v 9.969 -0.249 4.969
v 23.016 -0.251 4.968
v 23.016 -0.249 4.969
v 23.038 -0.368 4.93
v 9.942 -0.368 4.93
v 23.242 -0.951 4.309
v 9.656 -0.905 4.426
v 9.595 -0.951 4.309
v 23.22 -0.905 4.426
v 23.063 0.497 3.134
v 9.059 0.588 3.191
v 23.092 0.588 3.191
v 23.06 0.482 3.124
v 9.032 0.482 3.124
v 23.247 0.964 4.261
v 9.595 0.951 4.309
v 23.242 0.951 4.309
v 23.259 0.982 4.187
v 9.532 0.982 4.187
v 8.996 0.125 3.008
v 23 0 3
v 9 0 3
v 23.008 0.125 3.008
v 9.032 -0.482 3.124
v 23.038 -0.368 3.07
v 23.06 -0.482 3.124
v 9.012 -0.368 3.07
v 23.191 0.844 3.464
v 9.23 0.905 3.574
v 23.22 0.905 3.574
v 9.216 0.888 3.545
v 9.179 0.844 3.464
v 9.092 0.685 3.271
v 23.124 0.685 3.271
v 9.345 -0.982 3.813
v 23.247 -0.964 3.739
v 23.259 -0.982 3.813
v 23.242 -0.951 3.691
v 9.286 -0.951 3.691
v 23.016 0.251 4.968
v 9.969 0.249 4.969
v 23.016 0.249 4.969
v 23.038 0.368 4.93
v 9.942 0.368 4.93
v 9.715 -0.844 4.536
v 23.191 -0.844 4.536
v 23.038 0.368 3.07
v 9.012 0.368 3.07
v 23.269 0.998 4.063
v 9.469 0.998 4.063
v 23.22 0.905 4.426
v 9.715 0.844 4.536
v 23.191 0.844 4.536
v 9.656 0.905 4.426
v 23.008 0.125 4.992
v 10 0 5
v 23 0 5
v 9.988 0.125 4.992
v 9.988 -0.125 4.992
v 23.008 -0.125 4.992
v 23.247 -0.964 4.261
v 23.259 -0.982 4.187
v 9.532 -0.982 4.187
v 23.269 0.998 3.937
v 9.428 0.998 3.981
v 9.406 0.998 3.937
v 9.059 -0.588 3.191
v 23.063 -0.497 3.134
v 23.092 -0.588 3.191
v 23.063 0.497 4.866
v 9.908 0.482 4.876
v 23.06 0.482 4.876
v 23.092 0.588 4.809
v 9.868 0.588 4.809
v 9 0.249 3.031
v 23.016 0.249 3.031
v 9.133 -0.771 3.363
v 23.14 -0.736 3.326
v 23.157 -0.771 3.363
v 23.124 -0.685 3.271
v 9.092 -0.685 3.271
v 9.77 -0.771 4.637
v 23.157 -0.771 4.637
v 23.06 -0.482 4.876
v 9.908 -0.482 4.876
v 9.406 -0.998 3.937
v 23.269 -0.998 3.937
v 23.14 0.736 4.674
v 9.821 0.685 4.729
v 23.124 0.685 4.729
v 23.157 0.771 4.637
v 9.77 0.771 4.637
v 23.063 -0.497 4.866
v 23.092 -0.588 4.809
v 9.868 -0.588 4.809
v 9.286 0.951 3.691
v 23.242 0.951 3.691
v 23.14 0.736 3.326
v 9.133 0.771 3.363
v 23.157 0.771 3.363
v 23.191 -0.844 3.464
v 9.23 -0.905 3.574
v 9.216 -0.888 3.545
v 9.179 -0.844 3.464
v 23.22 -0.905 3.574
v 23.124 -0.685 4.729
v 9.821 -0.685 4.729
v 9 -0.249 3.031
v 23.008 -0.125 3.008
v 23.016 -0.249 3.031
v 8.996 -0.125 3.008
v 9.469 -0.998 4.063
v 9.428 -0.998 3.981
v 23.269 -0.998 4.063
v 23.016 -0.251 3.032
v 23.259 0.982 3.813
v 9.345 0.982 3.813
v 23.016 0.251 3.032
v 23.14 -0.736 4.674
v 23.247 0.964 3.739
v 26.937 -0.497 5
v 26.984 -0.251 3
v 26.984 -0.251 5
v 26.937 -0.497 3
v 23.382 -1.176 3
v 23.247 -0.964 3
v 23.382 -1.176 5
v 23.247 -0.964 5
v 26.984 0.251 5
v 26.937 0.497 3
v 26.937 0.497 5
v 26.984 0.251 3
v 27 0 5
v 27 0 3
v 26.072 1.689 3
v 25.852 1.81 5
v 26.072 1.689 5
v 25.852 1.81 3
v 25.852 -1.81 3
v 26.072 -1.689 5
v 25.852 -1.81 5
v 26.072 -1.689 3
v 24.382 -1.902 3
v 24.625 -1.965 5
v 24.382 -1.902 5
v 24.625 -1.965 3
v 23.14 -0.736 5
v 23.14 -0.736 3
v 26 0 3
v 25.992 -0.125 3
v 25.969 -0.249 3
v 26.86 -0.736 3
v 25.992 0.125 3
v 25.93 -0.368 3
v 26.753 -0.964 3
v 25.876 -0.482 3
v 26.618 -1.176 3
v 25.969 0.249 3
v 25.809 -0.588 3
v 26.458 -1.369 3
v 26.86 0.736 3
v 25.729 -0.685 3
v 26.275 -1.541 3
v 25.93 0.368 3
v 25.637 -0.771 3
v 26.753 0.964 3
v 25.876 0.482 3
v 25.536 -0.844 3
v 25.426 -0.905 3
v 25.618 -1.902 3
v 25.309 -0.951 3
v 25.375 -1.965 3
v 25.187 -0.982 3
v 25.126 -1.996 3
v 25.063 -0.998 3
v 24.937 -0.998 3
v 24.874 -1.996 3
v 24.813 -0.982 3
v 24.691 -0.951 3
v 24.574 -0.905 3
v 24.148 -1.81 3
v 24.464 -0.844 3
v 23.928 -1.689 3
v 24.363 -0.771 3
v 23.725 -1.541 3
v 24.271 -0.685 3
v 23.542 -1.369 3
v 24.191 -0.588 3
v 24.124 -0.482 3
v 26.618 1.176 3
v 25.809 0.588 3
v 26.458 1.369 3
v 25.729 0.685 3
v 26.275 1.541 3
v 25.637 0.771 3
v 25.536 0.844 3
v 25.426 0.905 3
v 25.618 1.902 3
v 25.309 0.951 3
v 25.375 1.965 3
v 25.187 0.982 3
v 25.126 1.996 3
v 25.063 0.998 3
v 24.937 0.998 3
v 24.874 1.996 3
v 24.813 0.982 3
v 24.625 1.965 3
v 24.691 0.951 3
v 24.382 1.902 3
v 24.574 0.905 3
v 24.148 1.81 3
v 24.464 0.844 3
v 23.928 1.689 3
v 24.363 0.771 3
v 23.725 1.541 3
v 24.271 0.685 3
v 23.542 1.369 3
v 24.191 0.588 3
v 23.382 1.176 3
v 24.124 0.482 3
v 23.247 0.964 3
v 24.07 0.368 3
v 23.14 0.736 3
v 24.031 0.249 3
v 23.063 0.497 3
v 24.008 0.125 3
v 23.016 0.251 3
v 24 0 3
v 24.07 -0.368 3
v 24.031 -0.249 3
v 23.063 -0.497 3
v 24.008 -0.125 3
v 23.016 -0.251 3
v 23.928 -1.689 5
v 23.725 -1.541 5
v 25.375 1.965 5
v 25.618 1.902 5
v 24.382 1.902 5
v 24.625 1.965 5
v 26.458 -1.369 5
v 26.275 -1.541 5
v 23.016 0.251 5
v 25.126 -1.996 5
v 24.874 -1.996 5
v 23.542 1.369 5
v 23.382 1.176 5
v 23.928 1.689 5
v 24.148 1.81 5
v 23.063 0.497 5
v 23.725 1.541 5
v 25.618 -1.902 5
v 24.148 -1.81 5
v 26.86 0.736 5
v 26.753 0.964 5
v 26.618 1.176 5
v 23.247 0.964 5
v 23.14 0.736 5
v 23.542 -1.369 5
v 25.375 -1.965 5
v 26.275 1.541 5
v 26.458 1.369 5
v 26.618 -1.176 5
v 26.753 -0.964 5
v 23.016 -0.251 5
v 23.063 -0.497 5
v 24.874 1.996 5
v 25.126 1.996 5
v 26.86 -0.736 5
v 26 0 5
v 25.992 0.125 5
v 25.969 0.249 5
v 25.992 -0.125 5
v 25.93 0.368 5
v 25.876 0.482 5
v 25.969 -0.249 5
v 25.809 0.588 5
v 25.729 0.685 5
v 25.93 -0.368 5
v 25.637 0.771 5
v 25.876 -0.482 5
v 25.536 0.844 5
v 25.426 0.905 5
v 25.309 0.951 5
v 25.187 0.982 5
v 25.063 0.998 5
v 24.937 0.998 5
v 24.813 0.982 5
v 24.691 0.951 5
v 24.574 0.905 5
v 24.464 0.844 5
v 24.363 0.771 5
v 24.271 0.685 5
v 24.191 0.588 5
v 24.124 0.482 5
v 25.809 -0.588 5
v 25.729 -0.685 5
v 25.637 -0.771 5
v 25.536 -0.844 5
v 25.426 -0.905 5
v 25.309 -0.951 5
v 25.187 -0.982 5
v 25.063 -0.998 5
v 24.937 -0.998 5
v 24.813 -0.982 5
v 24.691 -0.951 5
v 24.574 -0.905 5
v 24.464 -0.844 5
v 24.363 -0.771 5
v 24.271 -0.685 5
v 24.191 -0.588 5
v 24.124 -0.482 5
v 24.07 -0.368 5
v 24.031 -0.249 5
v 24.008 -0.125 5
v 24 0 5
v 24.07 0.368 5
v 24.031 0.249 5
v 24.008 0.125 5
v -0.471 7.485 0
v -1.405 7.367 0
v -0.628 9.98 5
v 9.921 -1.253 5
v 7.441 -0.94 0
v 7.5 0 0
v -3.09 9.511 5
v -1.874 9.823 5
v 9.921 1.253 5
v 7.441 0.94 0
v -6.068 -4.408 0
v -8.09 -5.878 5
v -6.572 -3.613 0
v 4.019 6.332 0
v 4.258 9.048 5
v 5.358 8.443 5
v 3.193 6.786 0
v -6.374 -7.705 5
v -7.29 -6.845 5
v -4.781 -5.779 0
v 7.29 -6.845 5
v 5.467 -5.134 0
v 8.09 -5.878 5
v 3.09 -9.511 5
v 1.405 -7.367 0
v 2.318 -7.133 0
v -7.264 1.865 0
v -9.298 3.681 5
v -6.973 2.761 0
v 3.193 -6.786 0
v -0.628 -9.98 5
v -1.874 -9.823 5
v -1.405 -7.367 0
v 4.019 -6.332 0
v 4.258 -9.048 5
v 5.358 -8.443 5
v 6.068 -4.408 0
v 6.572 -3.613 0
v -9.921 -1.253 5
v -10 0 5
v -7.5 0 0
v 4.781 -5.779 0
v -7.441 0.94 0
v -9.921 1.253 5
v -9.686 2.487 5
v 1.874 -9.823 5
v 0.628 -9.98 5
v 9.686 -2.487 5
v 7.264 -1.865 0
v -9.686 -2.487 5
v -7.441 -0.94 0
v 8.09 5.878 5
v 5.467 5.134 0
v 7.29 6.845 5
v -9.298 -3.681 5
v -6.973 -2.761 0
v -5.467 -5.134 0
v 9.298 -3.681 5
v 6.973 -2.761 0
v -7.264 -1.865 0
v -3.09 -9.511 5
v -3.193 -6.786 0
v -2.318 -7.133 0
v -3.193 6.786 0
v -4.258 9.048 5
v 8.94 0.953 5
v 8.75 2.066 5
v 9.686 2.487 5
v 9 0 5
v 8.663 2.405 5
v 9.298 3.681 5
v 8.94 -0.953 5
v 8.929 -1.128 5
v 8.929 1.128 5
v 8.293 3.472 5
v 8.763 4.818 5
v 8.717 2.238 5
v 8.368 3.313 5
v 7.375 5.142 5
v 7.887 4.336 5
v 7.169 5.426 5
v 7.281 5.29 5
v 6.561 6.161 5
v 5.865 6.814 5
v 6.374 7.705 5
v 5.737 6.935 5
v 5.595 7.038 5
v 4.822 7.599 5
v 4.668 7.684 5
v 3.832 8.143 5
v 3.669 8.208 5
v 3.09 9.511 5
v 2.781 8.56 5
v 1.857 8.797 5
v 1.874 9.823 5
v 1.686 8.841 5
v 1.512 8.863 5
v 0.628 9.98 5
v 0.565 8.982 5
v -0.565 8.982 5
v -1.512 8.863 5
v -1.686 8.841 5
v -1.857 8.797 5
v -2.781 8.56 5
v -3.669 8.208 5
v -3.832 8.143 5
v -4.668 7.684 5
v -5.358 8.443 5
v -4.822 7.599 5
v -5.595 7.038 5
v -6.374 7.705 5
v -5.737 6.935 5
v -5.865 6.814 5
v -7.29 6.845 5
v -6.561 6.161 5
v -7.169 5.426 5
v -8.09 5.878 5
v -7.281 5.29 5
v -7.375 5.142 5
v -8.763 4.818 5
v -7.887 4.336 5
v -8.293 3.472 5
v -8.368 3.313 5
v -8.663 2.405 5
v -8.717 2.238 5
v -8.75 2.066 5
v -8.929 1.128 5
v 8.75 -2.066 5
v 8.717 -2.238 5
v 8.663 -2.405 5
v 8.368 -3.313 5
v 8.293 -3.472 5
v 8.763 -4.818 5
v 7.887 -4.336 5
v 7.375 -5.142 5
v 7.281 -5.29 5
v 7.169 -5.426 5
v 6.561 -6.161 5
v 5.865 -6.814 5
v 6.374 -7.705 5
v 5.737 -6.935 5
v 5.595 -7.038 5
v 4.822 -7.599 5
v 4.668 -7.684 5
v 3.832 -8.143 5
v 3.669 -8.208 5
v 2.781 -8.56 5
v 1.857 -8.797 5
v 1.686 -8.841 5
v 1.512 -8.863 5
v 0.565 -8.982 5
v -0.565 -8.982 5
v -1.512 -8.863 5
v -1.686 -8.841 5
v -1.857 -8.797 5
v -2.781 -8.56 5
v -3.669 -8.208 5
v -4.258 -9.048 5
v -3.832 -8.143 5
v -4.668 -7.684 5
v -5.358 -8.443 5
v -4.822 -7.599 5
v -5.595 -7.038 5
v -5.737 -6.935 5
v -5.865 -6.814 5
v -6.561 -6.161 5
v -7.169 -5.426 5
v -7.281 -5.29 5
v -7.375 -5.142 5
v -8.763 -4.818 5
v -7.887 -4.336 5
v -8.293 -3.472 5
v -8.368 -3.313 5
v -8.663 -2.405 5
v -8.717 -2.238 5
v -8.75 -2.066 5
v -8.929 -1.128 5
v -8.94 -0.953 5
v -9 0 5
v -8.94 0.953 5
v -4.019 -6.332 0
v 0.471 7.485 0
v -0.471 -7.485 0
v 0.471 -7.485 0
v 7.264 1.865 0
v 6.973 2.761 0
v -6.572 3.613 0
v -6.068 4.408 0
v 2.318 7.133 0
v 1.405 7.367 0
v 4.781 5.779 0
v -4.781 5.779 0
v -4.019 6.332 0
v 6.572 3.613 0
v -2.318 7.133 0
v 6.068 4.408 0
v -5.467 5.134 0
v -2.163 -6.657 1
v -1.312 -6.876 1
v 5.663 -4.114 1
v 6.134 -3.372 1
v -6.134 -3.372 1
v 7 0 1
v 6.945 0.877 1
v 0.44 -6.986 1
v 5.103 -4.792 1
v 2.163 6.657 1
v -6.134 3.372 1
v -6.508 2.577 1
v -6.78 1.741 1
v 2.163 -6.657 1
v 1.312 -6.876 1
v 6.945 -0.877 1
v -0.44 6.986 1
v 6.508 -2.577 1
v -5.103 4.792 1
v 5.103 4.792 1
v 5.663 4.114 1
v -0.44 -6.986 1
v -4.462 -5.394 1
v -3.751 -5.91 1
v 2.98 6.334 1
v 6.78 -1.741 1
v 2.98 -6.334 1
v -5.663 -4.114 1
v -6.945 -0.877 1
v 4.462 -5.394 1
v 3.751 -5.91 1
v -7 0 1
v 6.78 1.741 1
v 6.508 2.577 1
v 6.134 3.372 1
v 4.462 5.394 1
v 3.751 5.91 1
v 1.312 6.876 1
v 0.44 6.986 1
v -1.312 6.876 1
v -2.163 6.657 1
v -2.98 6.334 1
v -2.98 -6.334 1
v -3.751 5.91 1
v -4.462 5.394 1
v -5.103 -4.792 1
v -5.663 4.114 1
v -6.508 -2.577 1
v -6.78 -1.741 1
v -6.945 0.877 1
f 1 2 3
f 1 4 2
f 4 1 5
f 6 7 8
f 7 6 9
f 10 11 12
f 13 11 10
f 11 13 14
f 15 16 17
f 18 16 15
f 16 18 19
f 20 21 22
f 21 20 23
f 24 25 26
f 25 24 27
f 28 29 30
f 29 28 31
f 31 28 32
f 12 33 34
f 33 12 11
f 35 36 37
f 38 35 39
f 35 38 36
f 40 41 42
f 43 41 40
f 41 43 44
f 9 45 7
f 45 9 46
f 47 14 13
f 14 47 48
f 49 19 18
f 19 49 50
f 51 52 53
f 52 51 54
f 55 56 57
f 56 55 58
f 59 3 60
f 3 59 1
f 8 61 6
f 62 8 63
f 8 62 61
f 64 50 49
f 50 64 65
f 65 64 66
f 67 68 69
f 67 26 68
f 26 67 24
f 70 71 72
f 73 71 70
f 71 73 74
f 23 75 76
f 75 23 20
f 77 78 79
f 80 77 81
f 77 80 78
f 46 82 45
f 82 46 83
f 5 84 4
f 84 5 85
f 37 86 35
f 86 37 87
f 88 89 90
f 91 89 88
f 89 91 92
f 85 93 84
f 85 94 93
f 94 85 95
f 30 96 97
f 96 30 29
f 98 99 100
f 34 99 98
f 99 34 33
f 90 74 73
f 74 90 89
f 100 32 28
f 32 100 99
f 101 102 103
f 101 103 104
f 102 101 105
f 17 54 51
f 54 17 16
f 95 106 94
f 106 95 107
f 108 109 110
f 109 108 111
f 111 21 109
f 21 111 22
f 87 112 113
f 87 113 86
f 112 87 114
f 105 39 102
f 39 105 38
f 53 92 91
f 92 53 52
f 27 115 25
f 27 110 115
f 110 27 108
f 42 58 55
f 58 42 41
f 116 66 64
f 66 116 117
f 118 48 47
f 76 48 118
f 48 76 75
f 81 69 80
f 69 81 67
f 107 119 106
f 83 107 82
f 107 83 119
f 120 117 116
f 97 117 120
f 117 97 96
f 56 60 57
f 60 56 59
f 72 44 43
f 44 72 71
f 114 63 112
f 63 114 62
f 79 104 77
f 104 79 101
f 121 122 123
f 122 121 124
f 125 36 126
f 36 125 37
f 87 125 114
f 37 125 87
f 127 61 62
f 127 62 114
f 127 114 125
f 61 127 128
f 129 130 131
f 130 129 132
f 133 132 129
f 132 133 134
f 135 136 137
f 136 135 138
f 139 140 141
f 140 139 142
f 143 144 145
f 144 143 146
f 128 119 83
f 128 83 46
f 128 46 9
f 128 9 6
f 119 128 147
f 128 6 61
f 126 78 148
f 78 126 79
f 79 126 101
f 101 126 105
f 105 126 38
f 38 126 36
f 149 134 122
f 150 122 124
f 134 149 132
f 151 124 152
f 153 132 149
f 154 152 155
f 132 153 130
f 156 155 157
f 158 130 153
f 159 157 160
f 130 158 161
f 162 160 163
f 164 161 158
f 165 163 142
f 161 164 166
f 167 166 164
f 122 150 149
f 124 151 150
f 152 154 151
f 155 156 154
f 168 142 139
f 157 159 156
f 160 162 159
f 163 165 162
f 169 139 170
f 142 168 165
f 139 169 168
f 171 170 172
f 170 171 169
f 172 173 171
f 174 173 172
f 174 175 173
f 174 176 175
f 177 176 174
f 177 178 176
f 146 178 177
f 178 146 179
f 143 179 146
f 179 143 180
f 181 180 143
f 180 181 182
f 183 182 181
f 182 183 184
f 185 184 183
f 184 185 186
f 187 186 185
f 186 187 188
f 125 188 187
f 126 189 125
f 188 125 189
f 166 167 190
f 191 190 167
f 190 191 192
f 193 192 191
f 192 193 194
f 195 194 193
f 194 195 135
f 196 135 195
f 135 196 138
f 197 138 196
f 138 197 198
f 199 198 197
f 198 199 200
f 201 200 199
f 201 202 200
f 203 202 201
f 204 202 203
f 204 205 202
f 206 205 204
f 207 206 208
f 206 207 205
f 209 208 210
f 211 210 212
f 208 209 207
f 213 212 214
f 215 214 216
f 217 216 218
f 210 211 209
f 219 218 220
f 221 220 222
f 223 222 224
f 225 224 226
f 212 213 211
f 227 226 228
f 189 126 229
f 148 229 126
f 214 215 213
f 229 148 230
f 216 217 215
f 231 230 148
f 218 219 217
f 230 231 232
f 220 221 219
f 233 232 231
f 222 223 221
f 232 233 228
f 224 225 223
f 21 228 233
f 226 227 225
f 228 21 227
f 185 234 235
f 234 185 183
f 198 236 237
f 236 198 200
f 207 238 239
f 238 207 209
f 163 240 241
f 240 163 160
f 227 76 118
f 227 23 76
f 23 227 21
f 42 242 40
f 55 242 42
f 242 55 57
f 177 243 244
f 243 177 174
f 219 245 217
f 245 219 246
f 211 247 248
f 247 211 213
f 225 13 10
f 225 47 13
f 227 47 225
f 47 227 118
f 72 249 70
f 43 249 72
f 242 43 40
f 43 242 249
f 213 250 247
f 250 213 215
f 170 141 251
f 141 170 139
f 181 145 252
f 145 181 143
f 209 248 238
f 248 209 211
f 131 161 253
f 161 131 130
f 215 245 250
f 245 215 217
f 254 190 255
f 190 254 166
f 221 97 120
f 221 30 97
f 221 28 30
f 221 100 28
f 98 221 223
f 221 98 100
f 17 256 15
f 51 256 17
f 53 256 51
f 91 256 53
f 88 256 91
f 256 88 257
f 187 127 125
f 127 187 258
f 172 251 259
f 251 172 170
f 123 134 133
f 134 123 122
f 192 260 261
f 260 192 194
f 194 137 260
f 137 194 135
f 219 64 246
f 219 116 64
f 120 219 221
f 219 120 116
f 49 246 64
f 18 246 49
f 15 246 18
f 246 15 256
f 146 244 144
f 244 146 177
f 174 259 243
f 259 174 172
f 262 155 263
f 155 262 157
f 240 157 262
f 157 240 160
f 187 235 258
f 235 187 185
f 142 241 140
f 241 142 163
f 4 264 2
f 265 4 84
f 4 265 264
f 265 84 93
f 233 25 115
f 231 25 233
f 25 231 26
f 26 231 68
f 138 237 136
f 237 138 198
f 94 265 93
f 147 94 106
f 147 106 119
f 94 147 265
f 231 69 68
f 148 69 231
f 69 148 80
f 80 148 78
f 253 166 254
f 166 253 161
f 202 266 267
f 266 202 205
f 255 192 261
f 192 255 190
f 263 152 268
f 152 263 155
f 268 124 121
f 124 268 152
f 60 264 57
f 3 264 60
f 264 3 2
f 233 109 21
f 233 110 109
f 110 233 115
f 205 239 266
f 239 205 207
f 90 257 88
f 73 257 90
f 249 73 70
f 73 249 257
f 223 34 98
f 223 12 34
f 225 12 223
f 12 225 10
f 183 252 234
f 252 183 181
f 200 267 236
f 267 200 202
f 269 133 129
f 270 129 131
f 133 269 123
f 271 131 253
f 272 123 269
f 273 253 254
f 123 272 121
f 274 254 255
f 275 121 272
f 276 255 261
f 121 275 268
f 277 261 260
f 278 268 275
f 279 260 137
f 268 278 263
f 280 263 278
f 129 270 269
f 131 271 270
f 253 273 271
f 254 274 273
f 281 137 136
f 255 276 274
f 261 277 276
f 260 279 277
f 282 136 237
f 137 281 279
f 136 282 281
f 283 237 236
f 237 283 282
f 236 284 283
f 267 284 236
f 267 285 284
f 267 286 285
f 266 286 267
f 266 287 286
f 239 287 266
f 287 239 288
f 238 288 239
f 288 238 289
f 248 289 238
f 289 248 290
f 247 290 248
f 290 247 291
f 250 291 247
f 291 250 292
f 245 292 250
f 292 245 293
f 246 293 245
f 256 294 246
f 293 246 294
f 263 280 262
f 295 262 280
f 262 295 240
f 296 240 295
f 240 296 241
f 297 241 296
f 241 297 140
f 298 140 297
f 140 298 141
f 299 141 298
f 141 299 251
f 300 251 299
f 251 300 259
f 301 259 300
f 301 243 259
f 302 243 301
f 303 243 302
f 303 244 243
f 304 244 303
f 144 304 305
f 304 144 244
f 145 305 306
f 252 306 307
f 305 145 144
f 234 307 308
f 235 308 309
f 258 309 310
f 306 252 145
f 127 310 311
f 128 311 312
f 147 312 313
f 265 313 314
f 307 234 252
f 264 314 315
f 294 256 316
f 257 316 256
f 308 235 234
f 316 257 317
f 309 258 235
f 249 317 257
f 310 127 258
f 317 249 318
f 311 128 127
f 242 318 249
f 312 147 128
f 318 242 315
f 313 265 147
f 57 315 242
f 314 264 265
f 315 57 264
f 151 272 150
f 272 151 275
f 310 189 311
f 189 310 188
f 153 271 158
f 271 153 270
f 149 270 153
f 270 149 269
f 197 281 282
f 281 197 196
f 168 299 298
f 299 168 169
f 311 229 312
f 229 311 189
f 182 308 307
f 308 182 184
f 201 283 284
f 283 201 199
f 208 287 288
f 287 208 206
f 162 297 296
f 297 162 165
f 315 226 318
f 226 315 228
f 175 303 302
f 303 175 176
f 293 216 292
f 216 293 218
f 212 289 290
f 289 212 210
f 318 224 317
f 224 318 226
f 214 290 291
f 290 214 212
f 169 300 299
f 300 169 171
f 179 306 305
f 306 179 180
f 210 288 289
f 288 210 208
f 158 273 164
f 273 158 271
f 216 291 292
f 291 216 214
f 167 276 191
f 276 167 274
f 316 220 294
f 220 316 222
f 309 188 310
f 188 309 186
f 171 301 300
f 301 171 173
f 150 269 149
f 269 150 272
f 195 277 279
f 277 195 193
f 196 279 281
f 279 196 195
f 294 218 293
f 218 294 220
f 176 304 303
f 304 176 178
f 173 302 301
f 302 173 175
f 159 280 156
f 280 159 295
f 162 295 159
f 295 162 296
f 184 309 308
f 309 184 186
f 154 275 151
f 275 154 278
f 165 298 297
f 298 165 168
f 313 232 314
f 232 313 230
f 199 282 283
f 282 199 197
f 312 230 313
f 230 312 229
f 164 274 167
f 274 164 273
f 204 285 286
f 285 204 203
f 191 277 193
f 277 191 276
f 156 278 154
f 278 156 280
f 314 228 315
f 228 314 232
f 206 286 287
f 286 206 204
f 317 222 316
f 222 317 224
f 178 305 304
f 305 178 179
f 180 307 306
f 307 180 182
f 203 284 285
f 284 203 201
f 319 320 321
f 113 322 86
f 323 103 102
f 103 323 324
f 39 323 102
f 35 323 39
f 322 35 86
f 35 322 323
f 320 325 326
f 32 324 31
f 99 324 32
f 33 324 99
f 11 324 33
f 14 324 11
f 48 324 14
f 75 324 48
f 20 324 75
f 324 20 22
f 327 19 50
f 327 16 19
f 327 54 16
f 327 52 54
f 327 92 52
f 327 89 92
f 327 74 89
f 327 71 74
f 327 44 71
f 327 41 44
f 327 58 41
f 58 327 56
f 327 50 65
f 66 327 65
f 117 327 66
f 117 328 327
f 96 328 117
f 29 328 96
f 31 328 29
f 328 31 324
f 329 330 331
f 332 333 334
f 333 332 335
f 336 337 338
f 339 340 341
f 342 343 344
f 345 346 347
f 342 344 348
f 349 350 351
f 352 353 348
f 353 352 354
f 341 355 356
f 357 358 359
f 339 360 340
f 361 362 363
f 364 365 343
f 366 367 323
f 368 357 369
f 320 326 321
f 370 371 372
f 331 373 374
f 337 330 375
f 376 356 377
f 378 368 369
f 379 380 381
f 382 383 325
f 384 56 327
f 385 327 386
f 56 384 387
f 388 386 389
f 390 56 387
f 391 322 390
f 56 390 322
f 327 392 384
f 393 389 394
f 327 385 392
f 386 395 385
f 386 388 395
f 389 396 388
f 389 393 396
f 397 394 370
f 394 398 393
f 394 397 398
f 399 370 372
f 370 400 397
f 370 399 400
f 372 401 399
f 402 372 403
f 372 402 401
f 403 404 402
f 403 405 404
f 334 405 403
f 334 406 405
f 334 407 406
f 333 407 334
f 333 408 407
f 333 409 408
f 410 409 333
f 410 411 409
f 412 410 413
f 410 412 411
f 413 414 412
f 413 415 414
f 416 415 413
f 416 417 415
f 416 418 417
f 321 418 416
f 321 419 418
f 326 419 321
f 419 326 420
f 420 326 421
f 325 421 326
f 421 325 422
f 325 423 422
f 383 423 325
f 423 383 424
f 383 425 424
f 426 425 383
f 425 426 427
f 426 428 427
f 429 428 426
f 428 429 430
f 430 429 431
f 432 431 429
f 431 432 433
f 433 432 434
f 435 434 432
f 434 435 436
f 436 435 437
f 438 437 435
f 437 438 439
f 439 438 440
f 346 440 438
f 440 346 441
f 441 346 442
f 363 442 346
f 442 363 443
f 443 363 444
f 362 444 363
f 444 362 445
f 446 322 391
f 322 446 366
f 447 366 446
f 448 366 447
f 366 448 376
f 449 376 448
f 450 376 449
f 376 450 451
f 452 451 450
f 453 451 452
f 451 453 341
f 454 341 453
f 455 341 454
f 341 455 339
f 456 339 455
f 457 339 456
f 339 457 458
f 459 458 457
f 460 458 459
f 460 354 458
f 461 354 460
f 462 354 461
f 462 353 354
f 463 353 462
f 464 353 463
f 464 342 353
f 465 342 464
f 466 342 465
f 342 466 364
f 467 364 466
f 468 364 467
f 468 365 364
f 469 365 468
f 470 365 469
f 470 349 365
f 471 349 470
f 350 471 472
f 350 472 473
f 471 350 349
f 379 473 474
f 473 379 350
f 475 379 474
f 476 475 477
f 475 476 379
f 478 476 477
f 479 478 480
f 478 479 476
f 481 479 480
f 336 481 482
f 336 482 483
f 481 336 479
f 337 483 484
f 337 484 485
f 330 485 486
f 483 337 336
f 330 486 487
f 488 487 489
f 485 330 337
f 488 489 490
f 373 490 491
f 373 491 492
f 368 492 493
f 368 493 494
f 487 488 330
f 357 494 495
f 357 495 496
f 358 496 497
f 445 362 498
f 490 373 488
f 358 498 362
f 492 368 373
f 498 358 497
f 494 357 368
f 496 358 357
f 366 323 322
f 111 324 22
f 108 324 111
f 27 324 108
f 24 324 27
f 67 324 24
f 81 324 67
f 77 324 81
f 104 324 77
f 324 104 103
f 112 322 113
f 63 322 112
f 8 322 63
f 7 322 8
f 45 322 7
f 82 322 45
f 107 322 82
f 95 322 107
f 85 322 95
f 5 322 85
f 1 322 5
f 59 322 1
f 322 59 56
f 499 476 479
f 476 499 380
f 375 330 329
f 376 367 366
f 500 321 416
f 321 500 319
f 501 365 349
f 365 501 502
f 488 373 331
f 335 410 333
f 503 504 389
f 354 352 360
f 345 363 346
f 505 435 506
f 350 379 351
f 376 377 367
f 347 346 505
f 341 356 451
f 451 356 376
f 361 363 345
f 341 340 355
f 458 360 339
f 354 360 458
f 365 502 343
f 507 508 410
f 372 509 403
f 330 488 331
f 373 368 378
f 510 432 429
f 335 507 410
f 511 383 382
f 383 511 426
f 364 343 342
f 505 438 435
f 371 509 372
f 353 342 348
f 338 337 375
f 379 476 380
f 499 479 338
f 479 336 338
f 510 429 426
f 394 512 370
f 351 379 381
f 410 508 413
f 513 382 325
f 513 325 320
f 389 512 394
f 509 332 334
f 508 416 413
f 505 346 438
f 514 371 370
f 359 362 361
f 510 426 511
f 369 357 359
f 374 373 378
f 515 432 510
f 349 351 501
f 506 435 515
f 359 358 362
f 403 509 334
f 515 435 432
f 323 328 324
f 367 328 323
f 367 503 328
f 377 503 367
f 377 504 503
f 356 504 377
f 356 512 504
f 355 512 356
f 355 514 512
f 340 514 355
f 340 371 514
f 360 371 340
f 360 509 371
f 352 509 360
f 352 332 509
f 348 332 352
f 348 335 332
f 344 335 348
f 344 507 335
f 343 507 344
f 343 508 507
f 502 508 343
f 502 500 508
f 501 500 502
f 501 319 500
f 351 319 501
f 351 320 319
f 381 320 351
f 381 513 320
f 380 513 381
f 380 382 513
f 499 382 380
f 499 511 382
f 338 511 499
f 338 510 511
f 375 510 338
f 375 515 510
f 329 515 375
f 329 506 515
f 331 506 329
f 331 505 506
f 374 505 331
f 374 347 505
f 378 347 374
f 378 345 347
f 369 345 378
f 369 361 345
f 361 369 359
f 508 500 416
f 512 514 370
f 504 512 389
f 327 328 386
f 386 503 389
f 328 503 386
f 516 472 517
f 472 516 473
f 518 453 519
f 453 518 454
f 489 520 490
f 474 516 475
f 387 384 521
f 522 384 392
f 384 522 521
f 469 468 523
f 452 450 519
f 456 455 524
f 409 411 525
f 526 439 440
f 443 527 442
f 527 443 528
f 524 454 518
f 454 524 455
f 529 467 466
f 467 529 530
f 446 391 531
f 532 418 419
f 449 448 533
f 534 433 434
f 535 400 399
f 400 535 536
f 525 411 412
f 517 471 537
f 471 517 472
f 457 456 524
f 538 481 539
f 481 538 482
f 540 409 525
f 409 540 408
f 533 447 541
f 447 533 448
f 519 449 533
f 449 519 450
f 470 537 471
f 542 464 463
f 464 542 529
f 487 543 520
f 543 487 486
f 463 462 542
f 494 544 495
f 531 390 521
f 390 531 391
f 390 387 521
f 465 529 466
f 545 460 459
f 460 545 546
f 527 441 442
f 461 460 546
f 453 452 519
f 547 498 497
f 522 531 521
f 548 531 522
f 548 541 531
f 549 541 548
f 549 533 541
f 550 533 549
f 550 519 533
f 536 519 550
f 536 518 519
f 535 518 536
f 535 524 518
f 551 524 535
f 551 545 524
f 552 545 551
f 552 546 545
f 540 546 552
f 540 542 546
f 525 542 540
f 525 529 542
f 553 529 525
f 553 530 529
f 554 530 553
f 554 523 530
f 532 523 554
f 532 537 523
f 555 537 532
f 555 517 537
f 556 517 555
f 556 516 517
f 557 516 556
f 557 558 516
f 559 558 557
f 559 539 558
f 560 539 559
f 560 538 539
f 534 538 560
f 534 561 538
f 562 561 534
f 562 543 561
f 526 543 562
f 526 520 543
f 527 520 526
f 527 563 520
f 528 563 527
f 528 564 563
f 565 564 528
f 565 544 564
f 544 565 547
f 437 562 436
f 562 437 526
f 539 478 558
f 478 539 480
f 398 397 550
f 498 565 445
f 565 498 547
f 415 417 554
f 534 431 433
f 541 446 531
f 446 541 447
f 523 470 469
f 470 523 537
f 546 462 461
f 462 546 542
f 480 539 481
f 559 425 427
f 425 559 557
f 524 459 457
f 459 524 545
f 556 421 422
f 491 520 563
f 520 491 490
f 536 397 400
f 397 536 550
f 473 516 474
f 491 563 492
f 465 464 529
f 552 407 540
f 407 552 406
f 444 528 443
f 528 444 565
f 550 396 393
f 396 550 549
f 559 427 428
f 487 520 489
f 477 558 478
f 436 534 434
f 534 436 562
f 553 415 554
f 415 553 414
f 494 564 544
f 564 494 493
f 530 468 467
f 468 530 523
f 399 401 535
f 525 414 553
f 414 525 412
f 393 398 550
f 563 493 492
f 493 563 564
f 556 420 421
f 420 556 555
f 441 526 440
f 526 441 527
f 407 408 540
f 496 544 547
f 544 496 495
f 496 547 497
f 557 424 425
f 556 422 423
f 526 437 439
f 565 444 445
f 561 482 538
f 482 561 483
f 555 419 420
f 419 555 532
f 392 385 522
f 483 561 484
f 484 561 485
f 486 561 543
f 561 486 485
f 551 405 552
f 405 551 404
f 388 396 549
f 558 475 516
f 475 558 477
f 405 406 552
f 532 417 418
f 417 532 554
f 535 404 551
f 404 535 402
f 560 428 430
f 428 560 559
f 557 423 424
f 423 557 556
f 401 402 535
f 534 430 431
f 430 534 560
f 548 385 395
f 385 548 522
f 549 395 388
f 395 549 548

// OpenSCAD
module panev(
    prumer1     = 15,
    prumer2     = 20,
    vyska       = 5,
    tloustka    = 1,

    prumer      = 2,
    delka       = 15

) {

    pozice_zaobleni = [ delka+prumer2/2, 0, 0 ];

    difference() {
        union() {
            // panev
            cylinder( d1=prumer1, d2=prumer2, h=vyska );
            // drzadlo
            translate([ 0, 0, vyska - prumer/2 ])
                difference() {
                    union() {
                        rotate([ 0, 90, 0 ])
                            cylinder( d=prumer, h=delka+prumer2/2 );
                        // zaobleny konec
                        translate( pozice_zaobleni )
                            cylinder( r=prumer, h=prumer, center=true );
                    }
                    // provrtani
                    translate( pozice_zaobleni )
                        cylinder( r=prumer-tloustka, h=2*prumer, center=true );
                }
        }
        // vnitrek panve
        translate([ 0, 0, tloustka ])
            cylinder( d1=prumer1-tloustka, d2=prumer2-tloustka, h=vyska );
    }


}

panev( $fn=50 );
